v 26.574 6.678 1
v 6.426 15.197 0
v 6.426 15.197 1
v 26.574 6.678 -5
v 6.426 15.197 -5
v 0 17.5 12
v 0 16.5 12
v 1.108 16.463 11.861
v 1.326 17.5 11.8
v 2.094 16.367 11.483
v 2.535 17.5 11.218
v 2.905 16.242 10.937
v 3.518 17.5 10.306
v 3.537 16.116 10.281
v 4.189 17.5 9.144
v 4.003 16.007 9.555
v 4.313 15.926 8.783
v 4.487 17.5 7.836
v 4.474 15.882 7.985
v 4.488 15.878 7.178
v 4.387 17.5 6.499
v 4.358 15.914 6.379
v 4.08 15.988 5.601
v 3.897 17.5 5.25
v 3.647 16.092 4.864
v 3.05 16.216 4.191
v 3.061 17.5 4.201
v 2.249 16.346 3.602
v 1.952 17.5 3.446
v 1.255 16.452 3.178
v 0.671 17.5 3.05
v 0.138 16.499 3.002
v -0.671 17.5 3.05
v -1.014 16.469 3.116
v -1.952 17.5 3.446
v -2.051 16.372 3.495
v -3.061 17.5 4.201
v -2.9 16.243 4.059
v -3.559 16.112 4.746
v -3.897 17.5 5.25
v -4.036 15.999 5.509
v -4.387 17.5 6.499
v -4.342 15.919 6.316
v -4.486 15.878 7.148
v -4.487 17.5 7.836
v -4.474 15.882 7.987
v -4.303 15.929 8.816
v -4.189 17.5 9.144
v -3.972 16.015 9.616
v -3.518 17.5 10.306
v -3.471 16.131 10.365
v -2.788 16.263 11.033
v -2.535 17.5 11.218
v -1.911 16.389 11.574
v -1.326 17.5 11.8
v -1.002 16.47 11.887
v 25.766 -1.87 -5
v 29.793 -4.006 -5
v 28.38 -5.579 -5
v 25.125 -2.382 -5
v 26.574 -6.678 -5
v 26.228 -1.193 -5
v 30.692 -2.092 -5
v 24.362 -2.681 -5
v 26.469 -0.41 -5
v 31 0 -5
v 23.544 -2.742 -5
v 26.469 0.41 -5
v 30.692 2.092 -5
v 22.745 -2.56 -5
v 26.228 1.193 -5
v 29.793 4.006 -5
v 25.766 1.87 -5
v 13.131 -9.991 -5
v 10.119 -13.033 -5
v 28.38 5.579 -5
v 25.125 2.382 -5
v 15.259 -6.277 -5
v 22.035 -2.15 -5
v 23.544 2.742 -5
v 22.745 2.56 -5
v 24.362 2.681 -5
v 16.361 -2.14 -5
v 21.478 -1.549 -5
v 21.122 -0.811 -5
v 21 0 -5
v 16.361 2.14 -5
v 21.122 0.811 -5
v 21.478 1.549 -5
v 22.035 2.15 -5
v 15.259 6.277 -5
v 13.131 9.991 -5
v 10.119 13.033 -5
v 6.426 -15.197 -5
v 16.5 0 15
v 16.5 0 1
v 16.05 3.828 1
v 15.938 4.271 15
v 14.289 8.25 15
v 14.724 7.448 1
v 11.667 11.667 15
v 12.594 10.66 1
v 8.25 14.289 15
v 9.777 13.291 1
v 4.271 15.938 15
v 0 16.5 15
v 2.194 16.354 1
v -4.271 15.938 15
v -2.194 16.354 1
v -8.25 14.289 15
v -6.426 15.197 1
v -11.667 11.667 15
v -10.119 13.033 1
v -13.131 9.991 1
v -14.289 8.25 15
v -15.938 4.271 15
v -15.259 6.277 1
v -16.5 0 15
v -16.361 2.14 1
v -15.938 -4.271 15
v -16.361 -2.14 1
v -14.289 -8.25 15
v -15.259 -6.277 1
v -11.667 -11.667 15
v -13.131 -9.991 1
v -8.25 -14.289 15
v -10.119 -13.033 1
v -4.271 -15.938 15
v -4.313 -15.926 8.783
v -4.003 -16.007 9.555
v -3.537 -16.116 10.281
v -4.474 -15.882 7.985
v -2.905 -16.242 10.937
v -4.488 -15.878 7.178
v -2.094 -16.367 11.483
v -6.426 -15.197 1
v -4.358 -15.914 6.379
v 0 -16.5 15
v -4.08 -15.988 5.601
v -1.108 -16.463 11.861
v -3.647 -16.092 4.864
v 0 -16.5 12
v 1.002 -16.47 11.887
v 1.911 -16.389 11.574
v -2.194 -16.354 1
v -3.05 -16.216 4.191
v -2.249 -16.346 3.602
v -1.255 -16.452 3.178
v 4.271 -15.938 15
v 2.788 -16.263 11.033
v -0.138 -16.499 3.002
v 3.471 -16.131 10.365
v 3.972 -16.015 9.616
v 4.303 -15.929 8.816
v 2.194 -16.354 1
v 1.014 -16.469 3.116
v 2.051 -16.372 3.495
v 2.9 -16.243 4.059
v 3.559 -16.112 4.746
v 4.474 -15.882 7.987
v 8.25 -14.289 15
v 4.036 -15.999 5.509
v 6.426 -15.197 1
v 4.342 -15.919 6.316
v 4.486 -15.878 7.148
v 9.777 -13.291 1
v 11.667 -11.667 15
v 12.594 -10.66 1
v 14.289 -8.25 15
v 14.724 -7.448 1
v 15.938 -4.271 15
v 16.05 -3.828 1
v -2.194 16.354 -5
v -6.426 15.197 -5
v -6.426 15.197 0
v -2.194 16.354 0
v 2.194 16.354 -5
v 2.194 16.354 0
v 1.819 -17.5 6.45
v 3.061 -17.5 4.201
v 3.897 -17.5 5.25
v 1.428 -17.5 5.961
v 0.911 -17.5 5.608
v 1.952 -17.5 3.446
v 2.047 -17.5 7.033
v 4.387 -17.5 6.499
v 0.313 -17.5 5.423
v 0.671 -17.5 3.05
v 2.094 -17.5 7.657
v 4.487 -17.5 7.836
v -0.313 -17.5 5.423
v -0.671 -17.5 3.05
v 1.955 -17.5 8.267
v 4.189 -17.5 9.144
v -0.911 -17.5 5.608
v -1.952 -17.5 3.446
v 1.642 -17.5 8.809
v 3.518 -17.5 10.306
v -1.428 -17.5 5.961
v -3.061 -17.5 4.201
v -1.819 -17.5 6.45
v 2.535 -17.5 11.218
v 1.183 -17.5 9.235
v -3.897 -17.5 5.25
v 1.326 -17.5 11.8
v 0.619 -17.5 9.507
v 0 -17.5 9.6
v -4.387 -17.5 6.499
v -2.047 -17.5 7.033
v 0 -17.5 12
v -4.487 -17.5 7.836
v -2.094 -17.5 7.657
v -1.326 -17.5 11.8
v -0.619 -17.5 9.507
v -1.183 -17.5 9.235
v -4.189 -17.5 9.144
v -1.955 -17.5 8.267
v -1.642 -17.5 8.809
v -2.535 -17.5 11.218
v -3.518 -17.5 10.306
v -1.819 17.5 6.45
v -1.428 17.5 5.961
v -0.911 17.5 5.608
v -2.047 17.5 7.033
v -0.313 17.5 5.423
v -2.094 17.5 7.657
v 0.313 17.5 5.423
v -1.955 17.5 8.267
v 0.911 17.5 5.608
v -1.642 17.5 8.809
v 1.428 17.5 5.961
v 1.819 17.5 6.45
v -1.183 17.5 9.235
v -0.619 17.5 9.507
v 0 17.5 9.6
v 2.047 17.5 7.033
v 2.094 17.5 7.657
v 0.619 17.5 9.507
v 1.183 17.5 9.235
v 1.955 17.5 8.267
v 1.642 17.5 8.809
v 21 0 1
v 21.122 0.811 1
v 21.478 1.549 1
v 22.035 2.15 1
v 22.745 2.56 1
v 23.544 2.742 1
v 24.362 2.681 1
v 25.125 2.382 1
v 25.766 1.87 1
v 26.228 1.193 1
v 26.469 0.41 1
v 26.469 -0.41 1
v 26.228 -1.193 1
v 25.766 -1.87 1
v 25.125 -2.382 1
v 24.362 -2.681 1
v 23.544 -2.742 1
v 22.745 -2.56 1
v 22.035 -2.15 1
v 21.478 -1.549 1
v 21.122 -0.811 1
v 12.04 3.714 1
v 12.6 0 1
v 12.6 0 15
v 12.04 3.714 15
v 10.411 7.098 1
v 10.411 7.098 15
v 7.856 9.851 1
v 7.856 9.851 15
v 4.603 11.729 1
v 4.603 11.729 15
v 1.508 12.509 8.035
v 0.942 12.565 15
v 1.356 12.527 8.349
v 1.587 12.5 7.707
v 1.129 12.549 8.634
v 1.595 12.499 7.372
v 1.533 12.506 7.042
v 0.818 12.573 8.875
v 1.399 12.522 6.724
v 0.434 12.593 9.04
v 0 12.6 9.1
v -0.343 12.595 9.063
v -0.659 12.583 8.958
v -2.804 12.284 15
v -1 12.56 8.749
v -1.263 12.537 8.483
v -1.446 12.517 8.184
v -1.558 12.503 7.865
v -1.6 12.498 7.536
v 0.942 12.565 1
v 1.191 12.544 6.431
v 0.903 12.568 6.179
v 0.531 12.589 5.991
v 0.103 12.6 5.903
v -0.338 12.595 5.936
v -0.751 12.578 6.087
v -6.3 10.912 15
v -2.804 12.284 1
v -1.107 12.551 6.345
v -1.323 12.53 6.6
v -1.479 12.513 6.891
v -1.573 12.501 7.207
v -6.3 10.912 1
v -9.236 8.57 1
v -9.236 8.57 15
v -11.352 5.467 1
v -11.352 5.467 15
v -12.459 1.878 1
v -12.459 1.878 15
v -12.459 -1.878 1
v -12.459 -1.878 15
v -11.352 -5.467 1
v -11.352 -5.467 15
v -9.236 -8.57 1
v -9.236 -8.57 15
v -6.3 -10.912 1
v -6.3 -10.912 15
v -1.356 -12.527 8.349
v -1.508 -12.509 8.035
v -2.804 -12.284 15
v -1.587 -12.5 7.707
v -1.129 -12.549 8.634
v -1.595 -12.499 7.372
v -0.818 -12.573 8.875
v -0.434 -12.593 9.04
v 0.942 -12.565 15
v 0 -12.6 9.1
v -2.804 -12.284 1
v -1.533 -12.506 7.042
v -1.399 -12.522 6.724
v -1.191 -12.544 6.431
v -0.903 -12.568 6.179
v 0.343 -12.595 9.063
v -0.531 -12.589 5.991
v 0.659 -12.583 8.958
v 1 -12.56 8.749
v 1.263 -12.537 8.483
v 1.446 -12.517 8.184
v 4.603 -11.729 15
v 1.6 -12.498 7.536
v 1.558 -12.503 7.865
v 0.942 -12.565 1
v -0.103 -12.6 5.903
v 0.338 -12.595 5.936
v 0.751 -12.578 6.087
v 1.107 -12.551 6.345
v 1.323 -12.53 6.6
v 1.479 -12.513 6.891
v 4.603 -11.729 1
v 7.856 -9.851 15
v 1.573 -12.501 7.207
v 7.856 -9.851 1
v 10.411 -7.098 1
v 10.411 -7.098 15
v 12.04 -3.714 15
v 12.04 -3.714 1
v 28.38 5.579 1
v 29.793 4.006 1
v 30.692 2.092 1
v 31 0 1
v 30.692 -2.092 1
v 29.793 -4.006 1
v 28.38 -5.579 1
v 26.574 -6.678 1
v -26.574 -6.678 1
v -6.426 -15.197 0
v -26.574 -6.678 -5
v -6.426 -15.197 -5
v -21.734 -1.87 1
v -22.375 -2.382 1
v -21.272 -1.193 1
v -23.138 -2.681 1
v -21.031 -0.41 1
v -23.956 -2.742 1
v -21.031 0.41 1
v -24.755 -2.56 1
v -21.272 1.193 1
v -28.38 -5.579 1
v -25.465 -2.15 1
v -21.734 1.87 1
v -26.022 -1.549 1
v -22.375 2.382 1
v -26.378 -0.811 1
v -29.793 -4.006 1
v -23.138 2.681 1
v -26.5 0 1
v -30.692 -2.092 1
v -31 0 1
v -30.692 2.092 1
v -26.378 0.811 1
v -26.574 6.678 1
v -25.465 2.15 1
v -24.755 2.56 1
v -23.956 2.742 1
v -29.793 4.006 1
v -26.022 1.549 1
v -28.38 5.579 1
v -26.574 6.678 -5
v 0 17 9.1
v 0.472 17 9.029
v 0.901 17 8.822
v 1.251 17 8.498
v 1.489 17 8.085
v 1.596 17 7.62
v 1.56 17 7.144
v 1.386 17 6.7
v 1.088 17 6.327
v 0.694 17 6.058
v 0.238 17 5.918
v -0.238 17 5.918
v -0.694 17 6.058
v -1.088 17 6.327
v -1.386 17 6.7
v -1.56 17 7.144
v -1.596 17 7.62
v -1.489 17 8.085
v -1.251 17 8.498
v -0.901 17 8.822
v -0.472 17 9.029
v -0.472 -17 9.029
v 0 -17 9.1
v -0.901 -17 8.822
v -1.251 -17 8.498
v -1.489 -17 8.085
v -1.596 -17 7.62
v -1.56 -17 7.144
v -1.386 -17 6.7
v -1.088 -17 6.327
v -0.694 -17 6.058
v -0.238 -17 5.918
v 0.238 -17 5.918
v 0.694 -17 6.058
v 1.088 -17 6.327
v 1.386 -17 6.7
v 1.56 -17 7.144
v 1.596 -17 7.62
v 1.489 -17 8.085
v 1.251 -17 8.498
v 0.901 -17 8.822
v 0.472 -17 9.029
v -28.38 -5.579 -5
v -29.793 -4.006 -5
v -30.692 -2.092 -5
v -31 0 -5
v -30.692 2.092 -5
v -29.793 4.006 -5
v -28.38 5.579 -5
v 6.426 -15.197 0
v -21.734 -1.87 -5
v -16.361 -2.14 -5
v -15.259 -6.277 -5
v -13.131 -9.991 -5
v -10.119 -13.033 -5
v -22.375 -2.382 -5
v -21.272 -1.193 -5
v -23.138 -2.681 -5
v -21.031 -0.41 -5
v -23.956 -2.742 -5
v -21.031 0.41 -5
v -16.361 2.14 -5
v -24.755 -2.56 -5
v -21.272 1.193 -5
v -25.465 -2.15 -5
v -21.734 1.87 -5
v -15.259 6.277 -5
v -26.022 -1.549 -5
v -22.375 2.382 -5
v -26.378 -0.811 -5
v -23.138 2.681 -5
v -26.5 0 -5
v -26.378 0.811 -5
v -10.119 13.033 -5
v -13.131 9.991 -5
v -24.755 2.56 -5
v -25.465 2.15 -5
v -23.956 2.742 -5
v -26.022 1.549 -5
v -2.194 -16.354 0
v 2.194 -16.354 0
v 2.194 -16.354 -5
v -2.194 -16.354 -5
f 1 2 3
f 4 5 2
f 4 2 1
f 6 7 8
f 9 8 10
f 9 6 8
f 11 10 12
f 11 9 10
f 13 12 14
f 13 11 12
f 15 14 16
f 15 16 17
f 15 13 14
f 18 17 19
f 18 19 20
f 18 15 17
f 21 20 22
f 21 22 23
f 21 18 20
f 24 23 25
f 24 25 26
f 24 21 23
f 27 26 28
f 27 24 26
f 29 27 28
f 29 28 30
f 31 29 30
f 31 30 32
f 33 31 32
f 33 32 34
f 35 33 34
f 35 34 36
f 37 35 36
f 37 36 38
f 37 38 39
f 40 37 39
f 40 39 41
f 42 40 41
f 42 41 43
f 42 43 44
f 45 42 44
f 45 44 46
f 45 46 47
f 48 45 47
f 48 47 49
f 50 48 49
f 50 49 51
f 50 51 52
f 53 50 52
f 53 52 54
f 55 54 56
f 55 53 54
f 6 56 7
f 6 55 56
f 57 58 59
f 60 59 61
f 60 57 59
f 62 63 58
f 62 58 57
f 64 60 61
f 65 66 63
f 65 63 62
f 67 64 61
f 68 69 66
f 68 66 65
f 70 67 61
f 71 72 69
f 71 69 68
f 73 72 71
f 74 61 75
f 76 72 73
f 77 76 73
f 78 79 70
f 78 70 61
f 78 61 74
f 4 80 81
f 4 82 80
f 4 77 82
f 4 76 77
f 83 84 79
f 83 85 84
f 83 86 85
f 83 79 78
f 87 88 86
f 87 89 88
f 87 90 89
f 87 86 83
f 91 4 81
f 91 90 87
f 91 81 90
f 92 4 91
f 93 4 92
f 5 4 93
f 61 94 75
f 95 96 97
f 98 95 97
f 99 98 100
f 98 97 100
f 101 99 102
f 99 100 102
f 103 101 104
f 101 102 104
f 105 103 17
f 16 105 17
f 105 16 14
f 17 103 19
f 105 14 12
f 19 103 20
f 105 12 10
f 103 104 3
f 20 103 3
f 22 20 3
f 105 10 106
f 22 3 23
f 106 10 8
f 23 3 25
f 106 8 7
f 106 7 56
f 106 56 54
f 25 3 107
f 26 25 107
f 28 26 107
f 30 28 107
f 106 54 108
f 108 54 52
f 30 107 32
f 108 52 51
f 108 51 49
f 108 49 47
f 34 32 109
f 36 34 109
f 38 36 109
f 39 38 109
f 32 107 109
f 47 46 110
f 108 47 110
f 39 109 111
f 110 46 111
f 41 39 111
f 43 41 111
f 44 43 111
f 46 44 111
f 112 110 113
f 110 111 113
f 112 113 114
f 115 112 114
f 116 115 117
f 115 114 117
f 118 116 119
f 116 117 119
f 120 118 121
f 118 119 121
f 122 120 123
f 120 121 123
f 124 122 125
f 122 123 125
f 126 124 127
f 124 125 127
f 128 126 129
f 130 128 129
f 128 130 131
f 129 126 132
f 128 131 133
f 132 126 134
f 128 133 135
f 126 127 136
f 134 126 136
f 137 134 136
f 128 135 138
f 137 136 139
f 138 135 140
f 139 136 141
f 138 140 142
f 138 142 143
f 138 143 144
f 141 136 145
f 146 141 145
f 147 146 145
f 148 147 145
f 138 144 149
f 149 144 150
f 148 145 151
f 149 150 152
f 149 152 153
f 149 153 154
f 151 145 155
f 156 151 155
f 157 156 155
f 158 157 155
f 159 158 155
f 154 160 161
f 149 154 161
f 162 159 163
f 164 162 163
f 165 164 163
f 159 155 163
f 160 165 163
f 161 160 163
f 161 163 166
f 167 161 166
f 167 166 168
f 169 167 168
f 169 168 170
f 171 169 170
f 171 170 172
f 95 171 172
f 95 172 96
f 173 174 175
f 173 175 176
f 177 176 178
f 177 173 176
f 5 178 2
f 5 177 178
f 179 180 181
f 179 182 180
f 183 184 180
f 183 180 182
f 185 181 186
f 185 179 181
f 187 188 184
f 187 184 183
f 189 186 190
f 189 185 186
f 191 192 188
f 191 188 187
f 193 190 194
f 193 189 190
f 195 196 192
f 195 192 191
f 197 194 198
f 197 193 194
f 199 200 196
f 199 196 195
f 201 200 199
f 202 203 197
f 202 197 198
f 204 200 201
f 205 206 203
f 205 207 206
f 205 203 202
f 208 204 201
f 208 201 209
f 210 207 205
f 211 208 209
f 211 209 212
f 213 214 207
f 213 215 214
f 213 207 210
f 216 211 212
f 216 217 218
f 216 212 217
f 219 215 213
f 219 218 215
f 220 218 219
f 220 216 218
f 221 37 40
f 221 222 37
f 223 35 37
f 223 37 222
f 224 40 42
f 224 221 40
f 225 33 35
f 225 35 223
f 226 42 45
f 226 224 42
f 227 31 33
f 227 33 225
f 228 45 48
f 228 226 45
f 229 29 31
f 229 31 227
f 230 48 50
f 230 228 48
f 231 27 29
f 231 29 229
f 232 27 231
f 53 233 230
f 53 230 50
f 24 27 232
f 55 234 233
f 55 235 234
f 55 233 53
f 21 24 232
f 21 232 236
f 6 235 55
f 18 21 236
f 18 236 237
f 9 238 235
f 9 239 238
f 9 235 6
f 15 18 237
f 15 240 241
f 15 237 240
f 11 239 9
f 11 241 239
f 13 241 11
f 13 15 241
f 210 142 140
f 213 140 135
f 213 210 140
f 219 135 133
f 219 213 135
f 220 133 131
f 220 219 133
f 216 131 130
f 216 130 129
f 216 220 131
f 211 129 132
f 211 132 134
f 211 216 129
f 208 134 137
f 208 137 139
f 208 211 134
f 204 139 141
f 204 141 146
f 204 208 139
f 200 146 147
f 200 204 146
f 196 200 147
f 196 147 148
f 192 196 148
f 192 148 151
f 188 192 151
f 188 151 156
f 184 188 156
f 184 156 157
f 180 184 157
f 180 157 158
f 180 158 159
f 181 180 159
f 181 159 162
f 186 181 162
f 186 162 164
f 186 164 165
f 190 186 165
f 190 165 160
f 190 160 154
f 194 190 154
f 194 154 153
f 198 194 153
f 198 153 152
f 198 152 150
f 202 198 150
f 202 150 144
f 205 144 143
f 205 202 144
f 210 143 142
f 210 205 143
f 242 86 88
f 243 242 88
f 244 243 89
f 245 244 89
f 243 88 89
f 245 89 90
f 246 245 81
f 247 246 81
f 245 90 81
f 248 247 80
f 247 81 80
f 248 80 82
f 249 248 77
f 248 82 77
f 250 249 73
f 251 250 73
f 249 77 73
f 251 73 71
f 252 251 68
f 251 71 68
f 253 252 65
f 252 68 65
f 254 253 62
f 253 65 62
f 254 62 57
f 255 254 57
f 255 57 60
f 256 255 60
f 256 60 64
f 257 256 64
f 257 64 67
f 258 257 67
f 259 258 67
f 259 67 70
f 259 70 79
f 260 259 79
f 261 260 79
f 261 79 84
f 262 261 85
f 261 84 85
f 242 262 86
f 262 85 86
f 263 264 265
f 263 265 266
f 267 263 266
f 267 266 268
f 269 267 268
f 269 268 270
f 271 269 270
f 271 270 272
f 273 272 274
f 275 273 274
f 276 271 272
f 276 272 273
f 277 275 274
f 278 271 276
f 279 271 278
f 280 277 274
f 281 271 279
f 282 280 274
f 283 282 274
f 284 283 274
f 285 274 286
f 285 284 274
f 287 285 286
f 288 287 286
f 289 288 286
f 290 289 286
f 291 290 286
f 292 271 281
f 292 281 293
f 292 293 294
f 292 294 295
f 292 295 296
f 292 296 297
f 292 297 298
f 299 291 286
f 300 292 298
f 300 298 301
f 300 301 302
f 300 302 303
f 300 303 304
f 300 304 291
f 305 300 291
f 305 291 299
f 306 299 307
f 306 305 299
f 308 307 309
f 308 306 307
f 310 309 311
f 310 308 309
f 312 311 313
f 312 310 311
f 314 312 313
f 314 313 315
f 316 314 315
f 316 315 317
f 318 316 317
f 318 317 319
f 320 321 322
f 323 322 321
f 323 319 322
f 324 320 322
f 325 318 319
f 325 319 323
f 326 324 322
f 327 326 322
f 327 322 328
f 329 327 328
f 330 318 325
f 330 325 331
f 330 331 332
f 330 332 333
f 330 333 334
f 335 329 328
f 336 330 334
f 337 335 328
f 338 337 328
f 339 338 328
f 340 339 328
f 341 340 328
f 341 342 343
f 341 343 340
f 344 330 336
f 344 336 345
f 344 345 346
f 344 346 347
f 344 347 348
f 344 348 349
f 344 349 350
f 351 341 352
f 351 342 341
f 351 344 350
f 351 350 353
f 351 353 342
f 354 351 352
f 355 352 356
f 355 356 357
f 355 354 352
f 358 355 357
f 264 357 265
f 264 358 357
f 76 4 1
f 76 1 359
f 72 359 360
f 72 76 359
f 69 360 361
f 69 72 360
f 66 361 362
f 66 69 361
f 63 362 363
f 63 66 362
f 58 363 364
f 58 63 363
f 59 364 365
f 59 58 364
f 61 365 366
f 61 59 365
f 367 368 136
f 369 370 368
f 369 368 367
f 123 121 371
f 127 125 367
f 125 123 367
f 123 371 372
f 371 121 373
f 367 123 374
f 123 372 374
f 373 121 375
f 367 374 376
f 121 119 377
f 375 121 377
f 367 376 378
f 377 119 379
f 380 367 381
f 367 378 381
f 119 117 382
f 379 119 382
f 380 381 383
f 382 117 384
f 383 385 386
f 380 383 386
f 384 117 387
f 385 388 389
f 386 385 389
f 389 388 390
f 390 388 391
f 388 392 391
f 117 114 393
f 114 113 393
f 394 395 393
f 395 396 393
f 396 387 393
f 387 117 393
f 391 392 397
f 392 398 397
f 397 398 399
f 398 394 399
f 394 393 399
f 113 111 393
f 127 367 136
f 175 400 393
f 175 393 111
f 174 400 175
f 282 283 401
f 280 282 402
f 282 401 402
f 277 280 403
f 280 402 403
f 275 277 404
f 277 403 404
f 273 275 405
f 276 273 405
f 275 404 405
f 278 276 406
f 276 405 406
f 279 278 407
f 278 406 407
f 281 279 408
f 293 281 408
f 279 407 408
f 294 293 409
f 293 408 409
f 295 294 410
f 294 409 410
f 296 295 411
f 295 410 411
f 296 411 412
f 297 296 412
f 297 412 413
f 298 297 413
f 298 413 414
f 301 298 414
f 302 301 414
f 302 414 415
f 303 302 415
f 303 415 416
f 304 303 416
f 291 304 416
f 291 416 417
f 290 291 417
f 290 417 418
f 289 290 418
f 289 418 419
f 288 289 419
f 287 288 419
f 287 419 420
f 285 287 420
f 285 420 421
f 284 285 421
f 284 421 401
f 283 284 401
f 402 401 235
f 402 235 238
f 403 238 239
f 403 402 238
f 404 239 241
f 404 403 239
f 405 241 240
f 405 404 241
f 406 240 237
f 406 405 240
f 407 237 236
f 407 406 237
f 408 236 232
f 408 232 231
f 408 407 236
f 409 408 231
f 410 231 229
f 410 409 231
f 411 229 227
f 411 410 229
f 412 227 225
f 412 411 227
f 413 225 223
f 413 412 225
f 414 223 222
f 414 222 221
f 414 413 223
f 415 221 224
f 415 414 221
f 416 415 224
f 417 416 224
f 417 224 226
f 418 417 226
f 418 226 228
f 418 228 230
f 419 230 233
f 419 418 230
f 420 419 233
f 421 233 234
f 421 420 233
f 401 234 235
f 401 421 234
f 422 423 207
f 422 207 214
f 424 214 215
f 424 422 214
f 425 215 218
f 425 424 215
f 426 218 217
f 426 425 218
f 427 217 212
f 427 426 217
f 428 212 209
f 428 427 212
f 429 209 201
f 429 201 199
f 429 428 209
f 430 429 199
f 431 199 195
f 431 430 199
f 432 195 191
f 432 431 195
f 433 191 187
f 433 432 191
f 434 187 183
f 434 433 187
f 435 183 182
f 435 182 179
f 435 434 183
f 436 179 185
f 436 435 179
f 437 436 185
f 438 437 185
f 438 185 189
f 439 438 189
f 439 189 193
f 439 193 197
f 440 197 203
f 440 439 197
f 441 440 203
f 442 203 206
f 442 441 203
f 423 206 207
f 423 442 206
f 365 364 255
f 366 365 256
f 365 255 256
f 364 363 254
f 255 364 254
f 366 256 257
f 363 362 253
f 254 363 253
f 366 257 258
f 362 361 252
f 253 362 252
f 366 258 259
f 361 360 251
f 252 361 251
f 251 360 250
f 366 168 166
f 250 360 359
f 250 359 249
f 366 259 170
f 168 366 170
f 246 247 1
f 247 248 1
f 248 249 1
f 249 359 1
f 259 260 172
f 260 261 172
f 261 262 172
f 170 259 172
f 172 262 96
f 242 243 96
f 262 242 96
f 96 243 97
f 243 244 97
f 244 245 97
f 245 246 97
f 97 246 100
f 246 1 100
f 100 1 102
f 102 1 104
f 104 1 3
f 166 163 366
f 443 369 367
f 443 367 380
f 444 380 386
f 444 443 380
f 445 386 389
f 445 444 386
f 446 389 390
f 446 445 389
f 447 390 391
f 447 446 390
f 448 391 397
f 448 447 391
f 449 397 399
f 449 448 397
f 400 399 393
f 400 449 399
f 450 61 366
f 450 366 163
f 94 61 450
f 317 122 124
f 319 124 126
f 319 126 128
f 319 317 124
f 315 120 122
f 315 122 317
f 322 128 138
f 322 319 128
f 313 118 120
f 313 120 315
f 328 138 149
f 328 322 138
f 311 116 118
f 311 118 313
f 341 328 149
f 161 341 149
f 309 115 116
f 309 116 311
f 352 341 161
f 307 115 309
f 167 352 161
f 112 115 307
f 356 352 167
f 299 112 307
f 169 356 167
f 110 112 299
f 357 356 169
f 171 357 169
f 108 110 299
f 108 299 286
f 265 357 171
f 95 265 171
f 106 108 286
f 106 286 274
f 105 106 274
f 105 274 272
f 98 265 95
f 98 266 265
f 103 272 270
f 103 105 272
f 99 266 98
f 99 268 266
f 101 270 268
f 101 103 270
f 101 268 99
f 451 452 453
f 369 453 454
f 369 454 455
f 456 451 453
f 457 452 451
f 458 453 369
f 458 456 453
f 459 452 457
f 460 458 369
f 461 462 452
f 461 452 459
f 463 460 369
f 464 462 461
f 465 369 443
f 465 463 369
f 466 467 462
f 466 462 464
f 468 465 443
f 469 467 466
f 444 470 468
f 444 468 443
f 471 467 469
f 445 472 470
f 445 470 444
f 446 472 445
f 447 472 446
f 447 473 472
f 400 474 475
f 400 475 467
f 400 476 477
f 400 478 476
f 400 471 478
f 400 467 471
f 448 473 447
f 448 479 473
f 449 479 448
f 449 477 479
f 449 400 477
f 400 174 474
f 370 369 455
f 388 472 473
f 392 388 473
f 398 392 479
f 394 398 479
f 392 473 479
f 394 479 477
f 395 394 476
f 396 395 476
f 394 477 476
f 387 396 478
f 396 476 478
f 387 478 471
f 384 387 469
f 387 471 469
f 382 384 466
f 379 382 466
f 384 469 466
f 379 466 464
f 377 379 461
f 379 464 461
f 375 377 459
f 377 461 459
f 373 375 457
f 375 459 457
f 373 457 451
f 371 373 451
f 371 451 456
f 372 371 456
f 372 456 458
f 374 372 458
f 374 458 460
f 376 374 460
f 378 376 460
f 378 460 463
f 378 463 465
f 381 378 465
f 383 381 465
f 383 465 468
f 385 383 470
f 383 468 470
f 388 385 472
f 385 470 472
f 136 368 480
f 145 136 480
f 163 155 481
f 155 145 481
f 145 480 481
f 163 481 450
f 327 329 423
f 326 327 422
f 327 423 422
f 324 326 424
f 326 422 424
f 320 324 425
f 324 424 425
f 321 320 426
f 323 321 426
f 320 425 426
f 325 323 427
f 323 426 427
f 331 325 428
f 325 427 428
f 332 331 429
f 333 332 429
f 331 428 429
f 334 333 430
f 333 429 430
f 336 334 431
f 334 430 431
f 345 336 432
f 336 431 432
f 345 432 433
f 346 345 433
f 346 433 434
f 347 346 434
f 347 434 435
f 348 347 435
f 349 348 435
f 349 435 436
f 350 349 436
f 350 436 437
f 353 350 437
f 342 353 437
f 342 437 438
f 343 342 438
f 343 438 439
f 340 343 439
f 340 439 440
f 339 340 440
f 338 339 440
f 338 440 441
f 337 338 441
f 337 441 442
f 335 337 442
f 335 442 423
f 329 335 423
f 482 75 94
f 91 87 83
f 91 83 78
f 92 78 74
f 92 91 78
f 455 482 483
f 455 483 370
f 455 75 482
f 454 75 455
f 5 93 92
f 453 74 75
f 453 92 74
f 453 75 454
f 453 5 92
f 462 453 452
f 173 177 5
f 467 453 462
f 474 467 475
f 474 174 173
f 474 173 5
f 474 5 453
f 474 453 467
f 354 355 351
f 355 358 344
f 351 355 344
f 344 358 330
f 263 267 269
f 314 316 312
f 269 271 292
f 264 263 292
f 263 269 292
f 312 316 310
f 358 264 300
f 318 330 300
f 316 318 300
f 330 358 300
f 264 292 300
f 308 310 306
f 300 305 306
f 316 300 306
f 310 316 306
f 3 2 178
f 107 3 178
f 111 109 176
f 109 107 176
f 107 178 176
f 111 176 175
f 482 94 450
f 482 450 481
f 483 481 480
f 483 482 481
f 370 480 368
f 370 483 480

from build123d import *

# Parameters (mm, degrees)
SKETCH1_R                = 16.5
SKETCH1_R_2              = 12.6
BOSS_EXTRUDE1_DEPTH      = 15
BOSS_EXTRUDE2_START      = 5
SKETCH2_R                = 16.5
BOSS_EXTRUDE2_DEPTH      = 5
BOSS_EXTRUDE3_REACH      = 42.66
BOSS_EXTRUDE3_END_RADIUS = 16.5
SKETCH3_R                = 4.5
CUT_EXTRUDE1_REACH       = 42.66
CUT_EXTRUDE1_END_RADIUS  = 12.6
SKETCH4_R                = 1.6
CIRPATTERN1_COUNT        = 2
CHAMFER1_SIZE            = 0.5
SKETCH5_R                = 2.75
BOSS_EXTRUDE4_DEPTH      = 6


with BuildPart() as part:
    # Sketch1 → Boss-Extrude1 (new body)
    with BuildSketch(Plane.XY):
        Circle(SKETCH1_R)
        Circle(SKETCH1_R_2, mode=Mode.SUBTRACT)
    extrude(amount=BOSS_EXTRUDE1_DEPTH)

    # Sketch2 → Boss-Extrude2 (add)
    with BuildSketch(Plane(origin=(0, 0, 0), x_dir=(-1, 0, 0), z_dir=(0, 0, -1)).offset(BOSS_EXTRUDE2_START)):
        Circle(SKETCH2_R)
    extrude(amount=-BOSS_EXTRUDE2_DEPTH)

    # Boss-Extrude3: up to this cylinder (the profile starts outside it)
    boss_extrude3_end = Plane(origin=(0, 0, 7.5), z_dir=(0, 0, -1)) * Cylinder(BOSS_EXTRUDE3_END_RADIUS, 119.32, mode=Mode.PRIVATE)
    # Sketch3 → Boss-Extrude3 (add, up to the surface)
    with BuildSketch(Plane(origin=(0, 17.5, 0), x_dir=(1, 0, 0), z_dir=(0, 1, 0)), mode=Mode.PRIVATE) as boss_extrude3_sk1:
        with Locations(Location((0, -7.5, 0), (0, 0, 270))):
            Circle(SKETCH3_R)
    boss_extrude3_tool1 = extrude(boss_extrude3_sk1.sketch, amount=-BOSS_EXTRUDE3_REACH, mode=Mode.PRIVATE) - boss_extrude3_end
    boss_extrude3 = boss_extrude3_tool1.solids().sort_by_distance((0, 17.5, 7.5))[0]
    add(boss_extrude3)

    # Cut-Extrude1: up to this cylinder (the profile starts outside it)
    cut_extrude1_end = Plane(origin=(0, 0, 7.5), z_dir=(0, 0, -1)) * Cylinder(CUT_EXTRUDE1_END_RADIUS, 111.52, mode=Mode.PRIVATE)
    # Sketch4 → Cut-Extrude1 (cut, up to the surface)
    with BuildSketch(Plane(origin=(0, 17.5, 0), x_dir=(1, 0, 0), z_dir=(0, 1, 0)), mode=Mode.PRIVATE) as cut_extrude1_sk1:
        with Locations(Location((0, -7.5, 0), (0, 0, 270))):
            Circle(SKETCH4_R)
    cut_extrude1_tool1 = extrude(cut_extrude1_sk1.sketch, amount=-CUT_EXTRUDE1_REACH, mode=Mode.PRIVATE) - cut_extrude1_end
    cut_extrude1 = cut_extrude1_tool1.solids().sort_by_distance((0, 17.5, 7.5))[0]
    add(cut_extrude1, mode=Mode.SUBTRACT)

    # CirPattern1: Boss-Extrude3, Cut-Extrude1 ×2 about axis
    cirpattern1_axis = Axis((0, 0, 15), (0, 0, 1))
    add([boss_extrude3.rotate(cirpattern1_axis, i * 360 / CIRPATTERN1_COUNT) for i in range(1, CIRPATTERN1_COUNT)])
    add([cut_extrude1.rotate(cirpattern1_axis, i * 360 / CIRPATTERN1_COUNT) for i in range(1, CIRPATTERN1_COUNT)], mode=Mode.SUBTRACT)

    # Chamfer1
    chamfer1_edges = [part.edges().sort_by_distance(p)[0] for p in [
        (0, 17.5, 5.9),
        (0, -17.5, 5.9),
    ]]
    chamfer(chamfer1_edges, length=CHAMFER1_SIZE)

    # Sketch5 → Boss-Extrude4 (add)
    with BuildSketch(Plane(origin=(0, 0, -5), x_dir=(-1, 0, 0), z_dir=(0, 0, -1))):
        with BuildLine():
            Line((26.573684211, 6.677522556), (6.426315789, 15.197120299))
            ThreePointArc((6.426315789, 15.197120299), (0, 16.5), (-6.426315789, 15.197120299))
            Line((-6.426315789, 15.197120299), (-26.573684211, 6.677522556))
            ThreePointArc((-26.573684211, 6.677522556), (-31, 0), (-26.573684211, -6.677522556))
            Line((-26.573684211, -6.677522556), (-6.426315789, -15.197120299))
            ThreePointArc((-6.426315789, -15.197120299), (0, -16.5), (6.426315789, -15.197120299))
            Line((6.426315789, -15.197120299), (26.573684211, -6.677522556))
            ThreePointArc((26.573684211, -6.677522556), (31, 0), (26.573684211, 6.677522556))
        make_face()
        with Locations((23.75, 0)):
            Circle(SKETCH5_R, mode=Mode.SUBTRACT)
        with Locations((-23.75, 0)):
            Circle(SKETCH5_R, mode=Mode.SUBTRACT)
    extrude(amount=-BOSS_EXTRUDE4_DEPTH)


solid = part.part
